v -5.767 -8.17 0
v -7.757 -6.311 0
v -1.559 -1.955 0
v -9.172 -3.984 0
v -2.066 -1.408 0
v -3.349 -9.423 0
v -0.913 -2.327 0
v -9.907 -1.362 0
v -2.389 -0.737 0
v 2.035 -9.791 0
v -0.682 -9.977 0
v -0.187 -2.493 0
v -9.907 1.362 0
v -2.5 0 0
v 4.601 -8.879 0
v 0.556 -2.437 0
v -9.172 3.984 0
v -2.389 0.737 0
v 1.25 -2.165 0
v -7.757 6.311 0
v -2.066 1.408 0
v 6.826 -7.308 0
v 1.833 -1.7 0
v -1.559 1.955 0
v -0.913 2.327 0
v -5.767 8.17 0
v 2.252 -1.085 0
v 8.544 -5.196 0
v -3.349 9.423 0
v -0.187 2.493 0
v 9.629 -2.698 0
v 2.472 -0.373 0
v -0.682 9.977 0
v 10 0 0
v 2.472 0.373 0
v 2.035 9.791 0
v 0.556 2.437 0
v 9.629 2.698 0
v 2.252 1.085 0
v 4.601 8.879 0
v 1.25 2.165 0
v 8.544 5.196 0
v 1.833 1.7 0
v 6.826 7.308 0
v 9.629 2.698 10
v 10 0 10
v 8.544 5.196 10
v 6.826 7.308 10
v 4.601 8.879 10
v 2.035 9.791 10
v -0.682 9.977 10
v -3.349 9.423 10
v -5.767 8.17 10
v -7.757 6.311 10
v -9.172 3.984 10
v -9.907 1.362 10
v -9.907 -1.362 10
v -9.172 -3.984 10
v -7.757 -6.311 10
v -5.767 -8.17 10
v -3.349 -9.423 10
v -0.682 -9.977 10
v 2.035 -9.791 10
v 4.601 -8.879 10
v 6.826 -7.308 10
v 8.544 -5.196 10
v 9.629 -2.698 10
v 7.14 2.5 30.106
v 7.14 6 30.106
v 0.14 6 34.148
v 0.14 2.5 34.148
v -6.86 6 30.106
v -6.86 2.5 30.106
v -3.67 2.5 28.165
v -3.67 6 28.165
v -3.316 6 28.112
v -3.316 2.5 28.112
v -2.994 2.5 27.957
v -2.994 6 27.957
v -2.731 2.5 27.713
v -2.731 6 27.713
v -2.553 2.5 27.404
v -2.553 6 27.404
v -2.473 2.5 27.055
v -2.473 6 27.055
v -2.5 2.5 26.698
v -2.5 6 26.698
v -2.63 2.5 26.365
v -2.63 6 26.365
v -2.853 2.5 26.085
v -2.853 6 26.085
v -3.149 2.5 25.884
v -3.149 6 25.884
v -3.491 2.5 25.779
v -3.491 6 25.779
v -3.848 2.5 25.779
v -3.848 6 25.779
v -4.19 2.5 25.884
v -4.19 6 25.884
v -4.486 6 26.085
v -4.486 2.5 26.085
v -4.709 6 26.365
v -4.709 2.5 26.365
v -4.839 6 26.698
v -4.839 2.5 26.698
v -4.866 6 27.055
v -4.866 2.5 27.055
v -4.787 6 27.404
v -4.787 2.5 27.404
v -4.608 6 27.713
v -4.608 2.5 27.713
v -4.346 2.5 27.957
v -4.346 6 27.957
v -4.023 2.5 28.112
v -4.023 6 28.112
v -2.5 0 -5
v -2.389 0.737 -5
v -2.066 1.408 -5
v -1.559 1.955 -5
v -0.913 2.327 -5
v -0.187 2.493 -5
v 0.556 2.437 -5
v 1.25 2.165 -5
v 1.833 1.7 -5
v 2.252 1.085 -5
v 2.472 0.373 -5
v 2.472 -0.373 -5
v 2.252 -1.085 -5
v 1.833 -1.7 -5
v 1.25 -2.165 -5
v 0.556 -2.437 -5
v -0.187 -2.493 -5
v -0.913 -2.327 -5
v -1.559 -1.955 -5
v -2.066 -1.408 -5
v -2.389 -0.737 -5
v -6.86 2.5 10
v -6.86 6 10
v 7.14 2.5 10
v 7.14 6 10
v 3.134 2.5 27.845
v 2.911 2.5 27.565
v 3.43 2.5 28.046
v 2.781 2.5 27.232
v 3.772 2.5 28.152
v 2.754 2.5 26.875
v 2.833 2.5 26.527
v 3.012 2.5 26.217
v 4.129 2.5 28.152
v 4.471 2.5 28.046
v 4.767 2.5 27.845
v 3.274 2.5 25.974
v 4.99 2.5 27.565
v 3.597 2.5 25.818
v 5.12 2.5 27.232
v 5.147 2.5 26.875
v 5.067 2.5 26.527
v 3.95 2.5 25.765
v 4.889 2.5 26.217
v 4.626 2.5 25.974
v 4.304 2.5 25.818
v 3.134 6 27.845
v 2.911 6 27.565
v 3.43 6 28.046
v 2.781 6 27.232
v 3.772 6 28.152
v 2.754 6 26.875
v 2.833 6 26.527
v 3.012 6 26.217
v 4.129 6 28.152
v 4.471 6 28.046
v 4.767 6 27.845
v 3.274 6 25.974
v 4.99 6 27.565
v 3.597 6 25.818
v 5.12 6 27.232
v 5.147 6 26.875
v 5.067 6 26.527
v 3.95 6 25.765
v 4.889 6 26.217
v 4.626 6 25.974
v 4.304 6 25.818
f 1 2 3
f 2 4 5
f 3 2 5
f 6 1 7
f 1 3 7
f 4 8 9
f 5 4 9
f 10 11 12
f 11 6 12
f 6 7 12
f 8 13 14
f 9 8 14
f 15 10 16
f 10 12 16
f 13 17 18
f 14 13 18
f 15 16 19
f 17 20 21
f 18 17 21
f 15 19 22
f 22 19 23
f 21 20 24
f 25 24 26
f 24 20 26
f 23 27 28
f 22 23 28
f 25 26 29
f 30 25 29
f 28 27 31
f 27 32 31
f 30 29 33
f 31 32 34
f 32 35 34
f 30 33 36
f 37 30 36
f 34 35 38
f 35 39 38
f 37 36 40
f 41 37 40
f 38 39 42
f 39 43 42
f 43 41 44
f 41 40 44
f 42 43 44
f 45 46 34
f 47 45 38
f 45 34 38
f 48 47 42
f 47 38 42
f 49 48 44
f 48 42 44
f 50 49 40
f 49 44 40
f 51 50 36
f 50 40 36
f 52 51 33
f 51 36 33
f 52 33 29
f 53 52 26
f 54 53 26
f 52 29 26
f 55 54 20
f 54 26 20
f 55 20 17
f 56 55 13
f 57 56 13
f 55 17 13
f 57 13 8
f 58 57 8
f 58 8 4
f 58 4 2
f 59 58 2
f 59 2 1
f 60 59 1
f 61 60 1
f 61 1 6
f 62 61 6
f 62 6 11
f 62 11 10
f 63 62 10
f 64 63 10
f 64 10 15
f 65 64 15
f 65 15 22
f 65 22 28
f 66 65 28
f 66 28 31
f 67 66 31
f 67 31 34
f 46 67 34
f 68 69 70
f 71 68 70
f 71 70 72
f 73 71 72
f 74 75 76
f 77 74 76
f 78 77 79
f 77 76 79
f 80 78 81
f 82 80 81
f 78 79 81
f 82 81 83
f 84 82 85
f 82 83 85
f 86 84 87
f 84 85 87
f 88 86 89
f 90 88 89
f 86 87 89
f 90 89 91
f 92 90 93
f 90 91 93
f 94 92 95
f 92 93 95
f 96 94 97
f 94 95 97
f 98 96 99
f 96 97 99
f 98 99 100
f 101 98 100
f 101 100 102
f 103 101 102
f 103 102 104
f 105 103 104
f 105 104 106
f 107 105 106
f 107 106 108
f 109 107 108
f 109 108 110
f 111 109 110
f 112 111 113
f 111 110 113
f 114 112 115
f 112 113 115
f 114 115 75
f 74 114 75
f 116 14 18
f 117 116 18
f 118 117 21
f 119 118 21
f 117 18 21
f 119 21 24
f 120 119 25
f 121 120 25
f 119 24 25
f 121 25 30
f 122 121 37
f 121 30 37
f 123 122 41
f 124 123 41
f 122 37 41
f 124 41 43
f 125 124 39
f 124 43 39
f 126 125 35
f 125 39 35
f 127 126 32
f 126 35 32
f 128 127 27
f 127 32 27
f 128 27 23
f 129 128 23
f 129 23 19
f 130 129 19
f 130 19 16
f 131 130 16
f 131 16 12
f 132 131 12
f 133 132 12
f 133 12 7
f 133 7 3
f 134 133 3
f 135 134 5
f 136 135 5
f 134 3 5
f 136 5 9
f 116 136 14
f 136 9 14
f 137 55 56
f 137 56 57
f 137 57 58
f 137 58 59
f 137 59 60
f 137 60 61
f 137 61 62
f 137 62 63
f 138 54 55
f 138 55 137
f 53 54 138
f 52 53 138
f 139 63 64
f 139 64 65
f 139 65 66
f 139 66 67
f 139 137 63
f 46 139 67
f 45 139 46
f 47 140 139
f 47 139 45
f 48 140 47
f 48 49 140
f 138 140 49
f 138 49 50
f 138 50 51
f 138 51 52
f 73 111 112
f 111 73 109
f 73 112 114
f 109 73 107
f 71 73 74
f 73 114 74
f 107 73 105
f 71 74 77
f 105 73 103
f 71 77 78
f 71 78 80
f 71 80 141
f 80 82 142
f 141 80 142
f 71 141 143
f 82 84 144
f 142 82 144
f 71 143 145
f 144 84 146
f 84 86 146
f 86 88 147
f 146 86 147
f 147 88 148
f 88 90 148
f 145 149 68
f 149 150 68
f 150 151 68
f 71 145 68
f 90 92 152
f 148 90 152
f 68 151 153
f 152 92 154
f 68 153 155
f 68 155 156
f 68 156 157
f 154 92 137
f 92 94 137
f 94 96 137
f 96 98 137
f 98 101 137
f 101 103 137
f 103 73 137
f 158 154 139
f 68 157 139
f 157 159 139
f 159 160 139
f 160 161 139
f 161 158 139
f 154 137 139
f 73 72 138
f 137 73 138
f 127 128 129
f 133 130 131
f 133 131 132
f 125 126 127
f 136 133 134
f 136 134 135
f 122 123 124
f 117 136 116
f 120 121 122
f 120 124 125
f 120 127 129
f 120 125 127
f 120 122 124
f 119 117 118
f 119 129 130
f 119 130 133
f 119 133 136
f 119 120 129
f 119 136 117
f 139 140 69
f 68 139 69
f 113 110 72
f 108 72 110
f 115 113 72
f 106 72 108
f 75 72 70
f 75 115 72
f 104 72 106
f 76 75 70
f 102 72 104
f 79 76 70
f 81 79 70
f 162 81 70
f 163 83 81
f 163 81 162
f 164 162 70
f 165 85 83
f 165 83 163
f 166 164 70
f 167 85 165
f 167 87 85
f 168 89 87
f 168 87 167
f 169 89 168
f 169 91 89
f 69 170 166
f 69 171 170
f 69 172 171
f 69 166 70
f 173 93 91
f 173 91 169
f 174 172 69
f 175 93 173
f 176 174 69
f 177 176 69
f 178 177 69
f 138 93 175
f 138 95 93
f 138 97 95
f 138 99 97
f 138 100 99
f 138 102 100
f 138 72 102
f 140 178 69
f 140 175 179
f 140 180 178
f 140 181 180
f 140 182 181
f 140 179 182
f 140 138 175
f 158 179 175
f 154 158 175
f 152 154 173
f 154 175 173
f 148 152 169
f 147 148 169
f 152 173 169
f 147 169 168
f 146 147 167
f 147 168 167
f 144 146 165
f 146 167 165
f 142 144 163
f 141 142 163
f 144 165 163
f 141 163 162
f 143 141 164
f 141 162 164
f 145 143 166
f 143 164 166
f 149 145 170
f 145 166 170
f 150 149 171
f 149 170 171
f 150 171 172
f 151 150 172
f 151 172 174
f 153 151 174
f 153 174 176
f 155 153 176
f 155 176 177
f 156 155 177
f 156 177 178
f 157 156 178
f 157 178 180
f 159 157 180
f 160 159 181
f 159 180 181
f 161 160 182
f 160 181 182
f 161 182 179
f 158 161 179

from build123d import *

# Parameters (mm, degrees)
CROQUIS1_R              = 15
SALIENTE_EXTRUIR1_DEPTH = 10
CROQUIS2_R              = 2.5
SALIENTE_EXTRUIR3_DEPTH = 5
CROQUIS3_W              = 27.214568237
CROQUIS3_H              = 3.5
SALIENTE_EXTRUIR5_DEPTH = 30
REDONDEO1_SIZE          = 10
REDONDEO2_SIZE          = 10
CROQUIS4_R              = 1.2
CORTAR_EXTRUIR7_DEPTH   = 30
CORTAR_EXTRUIR8_DEPTH   = 30
CORTAR_EXTRUIR9_START   = -30
CROQUIS8_R              = 15
CROQUIS8_R_2            = 10
CORTAR_EXTRUIR9_DEPTH   = 30
CROQUIS9_R              = 1.239789427
CROQUIS9_R_2            = 1.228877731
SALIENTE_EXTRUIR6_DEPTH = 3.5
CROQUIS10_R             = 1.2
CORTAR_EXTRUIR11_DEPTH  = 3.5


with BuildPart() as part:
    # Croquis1 → Saliente-Extruir1 (new body)
    with BuildSketch(Plane.XY):
        Circle(CROQUIS1_R)
    extrude(amount=SALIENTE_EXTRUIR1_DEPTH)

    # Croquis2 → Saliente-Extruir3 (add)
    with BuildSketch(Plane(origin=(0, 0, 0), x_dir=(-1, 0, 0), z_dir=(0, 0, -1))):
        Circle(CROQUIS2_R)
    extrude(amount=SALIENTE_EXTRUIR3_DEPTH)

    # Croquis3 → Saliente-Extruir5 (add)
    with BuildSketch(Plane.XY.offset(10)):
        with Locations((0.140442967, 4.25)):
            Rectangle(CROQUIS3_W, CROQUIS3_H)
    extrude(amount=SALIENTE_EXTRUIR5_DEPTH)

    # Redondeo1
    redondeo1_edges = [part.edges().sort_by_distance(p)[0] for p in [
        (13.747727085, 4.25, 40),
    ]]
    chamfer(redondeo1_edges, length=REDONDEO1_SIZE)

    # Redondeo2
    redondeo2_edges = [part.edges().sort_by_distance(p)[0] for p in [
        (-13.466841152, 4.25, 40),
    ]]
    chamfer(redondeo2_edges, length=REDONDEO2_SIZE)

    # Croquis4 → Cortar-Extruir7 (cut)
    with BuildSketch(Plane(origin=(0, 6, 0), x_dir=(1, 0, 0), z_dir=(0, 1, 0))):
        with Locations(Location((-2.669557034, -26.064684959, 0), (0, 0, 270))):
            Circle(CROQUIS4_R)
        with Locations(Location((2.950442966, -26.064684959, 0), (0, 0, 270))):
            Circle(CROQUIS4_R)
    extrude(amount=-CORTAR_EXTRUIR7_DEPTH, mode=Mode.SUBTRACT)

    # Croquis7 → Cortar-Extruir8 (cut)
    with BuildSketch(Plane(origin=(0, 6, 0), x_dir=(1, 0, 0), z_dir=(0, 1, 0))):
        Polygon((-6.859557034, -30.106136843), (-6.859557034, -22.023233074), (-6.859557034, -10), (-13.466841152, -10), (-13.466841152, -30), (-3.466841152, -40), (3.747727085, -40), (13.747727085, -30), (13.747727085, -10), (7.140442966, -10), (7.140442966, -22.023233074), (7.140442966, -30.106136843), (0.140442966, -34.147588727), align=None)
    extrude(amount=-CORTAR_EXTRUIR8_DEPTH, mode=Mode.SUBTRACT)

    # Croquis8 → Cortar-Extruir9 (cut)
    with BuildSketch(Plane.XY.offset(10).offset(CORTAR_EXTRUIR9_START)):
        Circle(CROQUIS8_R)
        Circle(CROQUIS8_R_2, mode=Mode.SUBTRACT)
    extrude(amount=CORTAR_EXTRUIR9_DEPTH, mode=Mode.SUBTRACT)

    # Croquis9 → Saliente-Extruir6 (add)
    with BuildSketch(Plane(origin=(0, 6, 0), x_dir=(1, 0, 0), z_dir=(0, 1, 0))):
        with Locations((-2.669557034, -26.064684959)):
            Circle(CROQUIS9_R)
        with Locations((2.950442966, -26.064684959)):
            Circle(CROQUIS9_R_2)
    extrude(amount=-SALIENTE_EXTRUIR6_DEPTH)

    # Croquis10 → Cortar-Extruir11 (cut)
    with BuildSketch(Plane(origin=(0, 6, 0), x_dir=(1, 0, 0), z_dir=(0, 1, 0))):
        with Locations(Location((-3.669557034, -26.965113623, 0), (0, 0, 270))):
            Circle(CROQUIS10_R)
        with Locations(Location((3.950442966, -26.965113623, 0), (0, 0, 90))):
            Circle(CROQUIS10_R)
    extrude(amount=-CORTAR_EXTRUIR11_DEPTH, mode=Mode.SUBTRACT)


solid = part.part
